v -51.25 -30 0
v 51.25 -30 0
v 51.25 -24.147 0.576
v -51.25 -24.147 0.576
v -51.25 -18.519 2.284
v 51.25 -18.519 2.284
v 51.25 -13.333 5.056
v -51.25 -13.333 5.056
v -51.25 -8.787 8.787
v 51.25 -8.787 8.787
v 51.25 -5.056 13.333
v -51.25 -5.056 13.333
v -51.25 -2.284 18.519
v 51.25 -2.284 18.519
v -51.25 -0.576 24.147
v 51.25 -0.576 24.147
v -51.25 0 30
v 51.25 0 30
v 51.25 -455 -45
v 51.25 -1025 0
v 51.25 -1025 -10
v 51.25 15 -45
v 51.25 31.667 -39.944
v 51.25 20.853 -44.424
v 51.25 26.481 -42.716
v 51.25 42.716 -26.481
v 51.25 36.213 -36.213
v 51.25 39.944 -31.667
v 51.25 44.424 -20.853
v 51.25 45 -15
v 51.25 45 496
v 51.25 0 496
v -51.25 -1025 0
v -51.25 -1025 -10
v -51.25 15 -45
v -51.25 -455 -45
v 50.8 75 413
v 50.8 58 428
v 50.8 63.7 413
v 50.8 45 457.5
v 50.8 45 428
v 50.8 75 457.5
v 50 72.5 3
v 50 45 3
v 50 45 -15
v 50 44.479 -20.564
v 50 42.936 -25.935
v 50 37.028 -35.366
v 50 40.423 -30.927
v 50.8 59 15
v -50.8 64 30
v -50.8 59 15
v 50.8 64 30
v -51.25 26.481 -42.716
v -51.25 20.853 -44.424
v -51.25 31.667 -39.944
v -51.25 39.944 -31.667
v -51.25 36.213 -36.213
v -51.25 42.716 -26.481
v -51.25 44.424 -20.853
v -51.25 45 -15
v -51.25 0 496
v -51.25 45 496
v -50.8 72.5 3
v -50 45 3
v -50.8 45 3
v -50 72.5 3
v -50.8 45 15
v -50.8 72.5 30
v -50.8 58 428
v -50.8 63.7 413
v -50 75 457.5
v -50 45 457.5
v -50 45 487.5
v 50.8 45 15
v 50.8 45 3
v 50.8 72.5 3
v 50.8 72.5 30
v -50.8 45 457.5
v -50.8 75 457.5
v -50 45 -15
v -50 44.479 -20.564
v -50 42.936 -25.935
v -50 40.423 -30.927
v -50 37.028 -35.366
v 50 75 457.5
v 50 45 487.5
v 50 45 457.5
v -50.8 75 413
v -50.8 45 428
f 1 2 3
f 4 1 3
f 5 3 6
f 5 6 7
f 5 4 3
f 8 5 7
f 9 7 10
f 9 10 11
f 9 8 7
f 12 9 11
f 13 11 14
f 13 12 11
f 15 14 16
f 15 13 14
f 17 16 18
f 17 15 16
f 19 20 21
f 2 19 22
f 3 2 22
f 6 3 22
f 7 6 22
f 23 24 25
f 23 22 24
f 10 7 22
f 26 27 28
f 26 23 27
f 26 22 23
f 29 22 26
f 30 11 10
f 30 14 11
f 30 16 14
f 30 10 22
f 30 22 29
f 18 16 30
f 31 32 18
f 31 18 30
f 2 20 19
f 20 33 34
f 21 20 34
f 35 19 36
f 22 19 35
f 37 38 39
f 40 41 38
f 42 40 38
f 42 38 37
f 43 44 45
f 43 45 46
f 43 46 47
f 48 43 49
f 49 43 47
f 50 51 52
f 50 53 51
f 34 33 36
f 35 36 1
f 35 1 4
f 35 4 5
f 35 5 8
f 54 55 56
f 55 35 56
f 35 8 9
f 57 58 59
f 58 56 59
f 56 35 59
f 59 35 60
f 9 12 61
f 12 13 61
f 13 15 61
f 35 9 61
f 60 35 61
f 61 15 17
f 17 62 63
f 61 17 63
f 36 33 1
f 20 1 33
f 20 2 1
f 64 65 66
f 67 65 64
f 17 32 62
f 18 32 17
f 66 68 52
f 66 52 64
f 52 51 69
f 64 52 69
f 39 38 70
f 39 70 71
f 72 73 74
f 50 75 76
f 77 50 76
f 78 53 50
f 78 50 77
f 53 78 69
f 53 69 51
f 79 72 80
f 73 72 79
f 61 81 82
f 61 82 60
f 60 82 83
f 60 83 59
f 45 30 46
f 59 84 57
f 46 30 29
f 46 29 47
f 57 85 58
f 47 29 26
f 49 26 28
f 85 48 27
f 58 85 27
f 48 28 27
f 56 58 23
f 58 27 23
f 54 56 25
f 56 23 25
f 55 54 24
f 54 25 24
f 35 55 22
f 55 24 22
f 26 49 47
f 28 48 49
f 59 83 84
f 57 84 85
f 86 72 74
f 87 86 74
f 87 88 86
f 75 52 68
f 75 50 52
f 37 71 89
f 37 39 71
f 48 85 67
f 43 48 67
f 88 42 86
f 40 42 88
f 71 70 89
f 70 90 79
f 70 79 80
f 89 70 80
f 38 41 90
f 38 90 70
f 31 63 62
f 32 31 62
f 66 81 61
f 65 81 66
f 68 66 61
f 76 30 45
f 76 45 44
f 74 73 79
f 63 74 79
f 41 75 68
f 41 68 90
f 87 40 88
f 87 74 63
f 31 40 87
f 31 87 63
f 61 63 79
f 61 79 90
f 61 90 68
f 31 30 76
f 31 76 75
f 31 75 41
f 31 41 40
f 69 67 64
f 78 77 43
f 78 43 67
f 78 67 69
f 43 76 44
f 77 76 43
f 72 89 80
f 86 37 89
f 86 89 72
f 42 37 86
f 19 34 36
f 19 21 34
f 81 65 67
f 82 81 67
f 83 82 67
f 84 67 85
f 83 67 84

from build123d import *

# Parameters (mm, degrees)
F1_DEPTH = 51.25
F2_R     = 30
F9_DEPTH = 50.8
F5_DEPTH = 50.8
F7_DEPTH = 50


with BuildPart() as f1:
    # F0 (on Right) → F1 (new body, symmetric)
    with BuildSketch(Plane.YZ):
        Polygon((-1025, -10), (-455, -45), (45, -45), (45, 496), (0, 496), (0, 0), (-1025, 0), align=None)
    extrude(amount=F1_DEPTH, both=True)

    # F2
    f2_edges = [f1.edges().sort_by_distance(p)[0] for p in [
        (0, 0, 0),
        (0, 45, -45),
    ]]
    fillet(f2_edges, radius=F2_R)

    # F3 (on Right) → F9 (join, symmetric)
    with BuildSketch(Plane.YZ):
        Polygon((45, 15), (45, 3), (72.5, 3), (72.5, 30), (64, 30), (59, 15), align=None)
    extrude(amount=F9_DEPTH, both=True)

    # F4 (on Right) → F5 (join, symmetric)
    with BuildSketch(Plane.YZ):
        Polygon((75, 457.5), (45, 457.5), (45, 428), (58, 428), (63.7, 413), (75, 413), align=None)
    extrude(amount=F5_DEPTH, both=True)

    # F6 (on Right) → F7 (join, symmetric)
    with BuildSketch(Plane.YZ):
        with BuildLine():
            Line((72.5, 3), (45, 3))
            Line((45, 3), (45, -15))
            ThreePointArc((45, -15), (42.9359111554, -25.9354866338), (37.0276754722, -35.3661855361))
            Line((37.0276754722, -35.3661855361), (72.5, 3))
        make_face()
        Polygon((75, 457.5), (45, 487.5), (45, 457.5), align=None)
    extrude(amount=F7_DEPTH, both=True)


solid = f1.part
